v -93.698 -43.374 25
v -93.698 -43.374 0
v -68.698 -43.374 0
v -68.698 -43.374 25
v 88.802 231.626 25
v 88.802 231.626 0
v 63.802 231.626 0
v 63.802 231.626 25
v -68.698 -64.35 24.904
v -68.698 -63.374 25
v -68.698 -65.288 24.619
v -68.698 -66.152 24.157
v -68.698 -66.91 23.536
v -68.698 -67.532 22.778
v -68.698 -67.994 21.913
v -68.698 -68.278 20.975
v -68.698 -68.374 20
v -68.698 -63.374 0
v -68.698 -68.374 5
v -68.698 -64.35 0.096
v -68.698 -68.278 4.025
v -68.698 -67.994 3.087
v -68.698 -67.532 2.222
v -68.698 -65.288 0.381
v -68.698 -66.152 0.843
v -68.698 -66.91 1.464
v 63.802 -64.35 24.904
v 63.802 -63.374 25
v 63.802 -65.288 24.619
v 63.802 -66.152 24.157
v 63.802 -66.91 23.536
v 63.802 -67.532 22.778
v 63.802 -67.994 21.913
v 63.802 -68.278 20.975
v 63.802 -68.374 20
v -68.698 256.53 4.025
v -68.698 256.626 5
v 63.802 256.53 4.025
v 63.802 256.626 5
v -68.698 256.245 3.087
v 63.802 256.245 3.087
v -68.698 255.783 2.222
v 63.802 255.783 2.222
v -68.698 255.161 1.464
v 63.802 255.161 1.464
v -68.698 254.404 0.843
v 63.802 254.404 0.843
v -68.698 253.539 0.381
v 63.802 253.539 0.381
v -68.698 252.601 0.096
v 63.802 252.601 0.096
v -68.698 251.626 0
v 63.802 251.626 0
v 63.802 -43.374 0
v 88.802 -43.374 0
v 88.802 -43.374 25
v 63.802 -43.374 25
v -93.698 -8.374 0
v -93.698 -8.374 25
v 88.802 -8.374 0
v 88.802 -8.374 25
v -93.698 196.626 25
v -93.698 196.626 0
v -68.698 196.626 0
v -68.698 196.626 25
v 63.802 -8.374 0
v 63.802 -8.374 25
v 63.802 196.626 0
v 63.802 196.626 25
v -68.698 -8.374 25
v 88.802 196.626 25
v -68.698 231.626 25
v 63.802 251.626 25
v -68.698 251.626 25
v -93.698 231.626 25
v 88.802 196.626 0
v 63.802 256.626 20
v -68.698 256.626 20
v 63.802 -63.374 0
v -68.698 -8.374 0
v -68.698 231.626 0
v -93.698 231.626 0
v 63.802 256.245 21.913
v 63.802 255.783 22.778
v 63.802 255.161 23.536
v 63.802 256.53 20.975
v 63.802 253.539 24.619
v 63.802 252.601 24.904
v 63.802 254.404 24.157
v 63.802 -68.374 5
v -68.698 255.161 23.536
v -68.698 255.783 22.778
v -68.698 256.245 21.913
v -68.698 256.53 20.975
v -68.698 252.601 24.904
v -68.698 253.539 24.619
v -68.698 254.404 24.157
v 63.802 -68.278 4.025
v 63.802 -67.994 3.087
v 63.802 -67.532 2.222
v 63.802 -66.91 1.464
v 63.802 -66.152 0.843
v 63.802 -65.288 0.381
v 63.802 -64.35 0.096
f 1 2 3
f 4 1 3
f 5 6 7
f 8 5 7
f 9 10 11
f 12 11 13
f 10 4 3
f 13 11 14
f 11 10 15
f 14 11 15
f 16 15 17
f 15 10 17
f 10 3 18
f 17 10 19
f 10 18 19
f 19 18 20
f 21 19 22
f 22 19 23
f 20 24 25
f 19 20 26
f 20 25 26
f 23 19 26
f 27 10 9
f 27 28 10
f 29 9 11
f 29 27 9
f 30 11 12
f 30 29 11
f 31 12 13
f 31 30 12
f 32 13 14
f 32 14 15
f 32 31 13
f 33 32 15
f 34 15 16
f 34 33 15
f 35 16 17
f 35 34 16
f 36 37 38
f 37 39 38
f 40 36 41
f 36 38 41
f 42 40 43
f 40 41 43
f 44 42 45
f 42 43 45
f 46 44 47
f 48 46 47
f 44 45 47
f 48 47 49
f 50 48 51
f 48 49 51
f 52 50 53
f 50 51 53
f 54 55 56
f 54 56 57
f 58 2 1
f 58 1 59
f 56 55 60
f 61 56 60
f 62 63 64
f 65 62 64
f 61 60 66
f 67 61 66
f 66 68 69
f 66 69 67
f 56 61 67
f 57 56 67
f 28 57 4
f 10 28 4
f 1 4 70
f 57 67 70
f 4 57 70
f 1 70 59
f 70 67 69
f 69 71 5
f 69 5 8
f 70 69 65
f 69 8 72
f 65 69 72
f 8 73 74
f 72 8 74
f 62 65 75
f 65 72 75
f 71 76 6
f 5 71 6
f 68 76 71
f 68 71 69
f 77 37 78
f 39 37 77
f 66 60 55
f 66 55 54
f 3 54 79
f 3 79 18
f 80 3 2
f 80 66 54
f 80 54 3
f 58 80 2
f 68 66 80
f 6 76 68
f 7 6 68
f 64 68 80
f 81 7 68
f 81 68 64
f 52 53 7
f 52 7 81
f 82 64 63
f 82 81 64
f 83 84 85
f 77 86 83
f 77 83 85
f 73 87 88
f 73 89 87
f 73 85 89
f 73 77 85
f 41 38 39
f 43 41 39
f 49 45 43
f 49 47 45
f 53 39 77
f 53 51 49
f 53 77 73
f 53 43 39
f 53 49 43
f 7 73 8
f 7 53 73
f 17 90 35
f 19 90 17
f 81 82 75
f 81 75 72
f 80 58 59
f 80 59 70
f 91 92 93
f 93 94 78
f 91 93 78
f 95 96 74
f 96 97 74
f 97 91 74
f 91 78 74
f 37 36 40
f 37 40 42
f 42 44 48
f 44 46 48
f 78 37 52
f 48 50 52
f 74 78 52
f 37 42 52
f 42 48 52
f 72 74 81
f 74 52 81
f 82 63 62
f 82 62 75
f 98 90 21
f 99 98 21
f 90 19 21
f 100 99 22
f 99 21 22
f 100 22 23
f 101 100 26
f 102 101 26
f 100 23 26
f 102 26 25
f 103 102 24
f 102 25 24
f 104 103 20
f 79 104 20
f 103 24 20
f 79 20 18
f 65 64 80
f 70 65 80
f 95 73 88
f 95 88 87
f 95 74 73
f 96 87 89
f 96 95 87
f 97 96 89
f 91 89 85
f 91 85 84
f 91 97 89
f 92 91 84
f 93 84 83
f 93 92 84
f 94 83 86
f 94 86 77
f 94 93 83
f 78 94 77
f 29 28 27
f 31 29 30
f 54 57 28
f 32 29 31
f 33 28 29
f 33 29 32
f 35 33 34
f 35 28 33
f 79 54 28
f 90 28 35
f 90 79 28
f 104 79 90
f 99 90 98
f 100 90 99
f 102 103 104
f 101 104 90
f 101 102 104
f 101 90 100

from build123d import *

# Parameters (mm, degrees)
F0_W     = 25
F0_H     = 35
F1_DEPTH = 25
F3_R     = 5


with BuildPart() as f1:
    # F0 (on Top) → F1 (new body)
    with BuildSketch(Plane.XY):
        with Locations((-81.198196, -25.874247)):
            Rectangle(F0_W, F0_H)
        with Locations((-81.198196, 214.125753)):
            Rectangle(F0_W, F0_H)
        Polygon((-2.448196, 256.625753), (-68.698196, 256.625753), (-68.698196, 231.625753), (-68.698196, 196.625753), (-68.698196, -8.374247), (-68.698196, -43.374247), (-68.698196, -68.374247), (-2.448196, -68.374247), align=None)
    extrude(amount=F1_DEPTH)

    # F2: F1 across face


with BuildPart() as f1_1:
    add(f1.part)
    add(f1.part.mirror(Plane(origin=(-2.448196, 94.125753, 12.5), x_dir=(0, 1, 0), z_dir=(1, 0, 0))))

    # F3
    f3_edges = [f1_1.edges().sort_by_distance(p)[0] for p in [
        (-2.448196, 256.625753, 0),
        (-2.448196, 256.625753, 25),
        (-2.448196, -68.374247, 0),
        (-2.448196, -68.374247, 25),
    ]]
    fillet(f3_edges, radius=F3_R)


solid = f1_1.part
